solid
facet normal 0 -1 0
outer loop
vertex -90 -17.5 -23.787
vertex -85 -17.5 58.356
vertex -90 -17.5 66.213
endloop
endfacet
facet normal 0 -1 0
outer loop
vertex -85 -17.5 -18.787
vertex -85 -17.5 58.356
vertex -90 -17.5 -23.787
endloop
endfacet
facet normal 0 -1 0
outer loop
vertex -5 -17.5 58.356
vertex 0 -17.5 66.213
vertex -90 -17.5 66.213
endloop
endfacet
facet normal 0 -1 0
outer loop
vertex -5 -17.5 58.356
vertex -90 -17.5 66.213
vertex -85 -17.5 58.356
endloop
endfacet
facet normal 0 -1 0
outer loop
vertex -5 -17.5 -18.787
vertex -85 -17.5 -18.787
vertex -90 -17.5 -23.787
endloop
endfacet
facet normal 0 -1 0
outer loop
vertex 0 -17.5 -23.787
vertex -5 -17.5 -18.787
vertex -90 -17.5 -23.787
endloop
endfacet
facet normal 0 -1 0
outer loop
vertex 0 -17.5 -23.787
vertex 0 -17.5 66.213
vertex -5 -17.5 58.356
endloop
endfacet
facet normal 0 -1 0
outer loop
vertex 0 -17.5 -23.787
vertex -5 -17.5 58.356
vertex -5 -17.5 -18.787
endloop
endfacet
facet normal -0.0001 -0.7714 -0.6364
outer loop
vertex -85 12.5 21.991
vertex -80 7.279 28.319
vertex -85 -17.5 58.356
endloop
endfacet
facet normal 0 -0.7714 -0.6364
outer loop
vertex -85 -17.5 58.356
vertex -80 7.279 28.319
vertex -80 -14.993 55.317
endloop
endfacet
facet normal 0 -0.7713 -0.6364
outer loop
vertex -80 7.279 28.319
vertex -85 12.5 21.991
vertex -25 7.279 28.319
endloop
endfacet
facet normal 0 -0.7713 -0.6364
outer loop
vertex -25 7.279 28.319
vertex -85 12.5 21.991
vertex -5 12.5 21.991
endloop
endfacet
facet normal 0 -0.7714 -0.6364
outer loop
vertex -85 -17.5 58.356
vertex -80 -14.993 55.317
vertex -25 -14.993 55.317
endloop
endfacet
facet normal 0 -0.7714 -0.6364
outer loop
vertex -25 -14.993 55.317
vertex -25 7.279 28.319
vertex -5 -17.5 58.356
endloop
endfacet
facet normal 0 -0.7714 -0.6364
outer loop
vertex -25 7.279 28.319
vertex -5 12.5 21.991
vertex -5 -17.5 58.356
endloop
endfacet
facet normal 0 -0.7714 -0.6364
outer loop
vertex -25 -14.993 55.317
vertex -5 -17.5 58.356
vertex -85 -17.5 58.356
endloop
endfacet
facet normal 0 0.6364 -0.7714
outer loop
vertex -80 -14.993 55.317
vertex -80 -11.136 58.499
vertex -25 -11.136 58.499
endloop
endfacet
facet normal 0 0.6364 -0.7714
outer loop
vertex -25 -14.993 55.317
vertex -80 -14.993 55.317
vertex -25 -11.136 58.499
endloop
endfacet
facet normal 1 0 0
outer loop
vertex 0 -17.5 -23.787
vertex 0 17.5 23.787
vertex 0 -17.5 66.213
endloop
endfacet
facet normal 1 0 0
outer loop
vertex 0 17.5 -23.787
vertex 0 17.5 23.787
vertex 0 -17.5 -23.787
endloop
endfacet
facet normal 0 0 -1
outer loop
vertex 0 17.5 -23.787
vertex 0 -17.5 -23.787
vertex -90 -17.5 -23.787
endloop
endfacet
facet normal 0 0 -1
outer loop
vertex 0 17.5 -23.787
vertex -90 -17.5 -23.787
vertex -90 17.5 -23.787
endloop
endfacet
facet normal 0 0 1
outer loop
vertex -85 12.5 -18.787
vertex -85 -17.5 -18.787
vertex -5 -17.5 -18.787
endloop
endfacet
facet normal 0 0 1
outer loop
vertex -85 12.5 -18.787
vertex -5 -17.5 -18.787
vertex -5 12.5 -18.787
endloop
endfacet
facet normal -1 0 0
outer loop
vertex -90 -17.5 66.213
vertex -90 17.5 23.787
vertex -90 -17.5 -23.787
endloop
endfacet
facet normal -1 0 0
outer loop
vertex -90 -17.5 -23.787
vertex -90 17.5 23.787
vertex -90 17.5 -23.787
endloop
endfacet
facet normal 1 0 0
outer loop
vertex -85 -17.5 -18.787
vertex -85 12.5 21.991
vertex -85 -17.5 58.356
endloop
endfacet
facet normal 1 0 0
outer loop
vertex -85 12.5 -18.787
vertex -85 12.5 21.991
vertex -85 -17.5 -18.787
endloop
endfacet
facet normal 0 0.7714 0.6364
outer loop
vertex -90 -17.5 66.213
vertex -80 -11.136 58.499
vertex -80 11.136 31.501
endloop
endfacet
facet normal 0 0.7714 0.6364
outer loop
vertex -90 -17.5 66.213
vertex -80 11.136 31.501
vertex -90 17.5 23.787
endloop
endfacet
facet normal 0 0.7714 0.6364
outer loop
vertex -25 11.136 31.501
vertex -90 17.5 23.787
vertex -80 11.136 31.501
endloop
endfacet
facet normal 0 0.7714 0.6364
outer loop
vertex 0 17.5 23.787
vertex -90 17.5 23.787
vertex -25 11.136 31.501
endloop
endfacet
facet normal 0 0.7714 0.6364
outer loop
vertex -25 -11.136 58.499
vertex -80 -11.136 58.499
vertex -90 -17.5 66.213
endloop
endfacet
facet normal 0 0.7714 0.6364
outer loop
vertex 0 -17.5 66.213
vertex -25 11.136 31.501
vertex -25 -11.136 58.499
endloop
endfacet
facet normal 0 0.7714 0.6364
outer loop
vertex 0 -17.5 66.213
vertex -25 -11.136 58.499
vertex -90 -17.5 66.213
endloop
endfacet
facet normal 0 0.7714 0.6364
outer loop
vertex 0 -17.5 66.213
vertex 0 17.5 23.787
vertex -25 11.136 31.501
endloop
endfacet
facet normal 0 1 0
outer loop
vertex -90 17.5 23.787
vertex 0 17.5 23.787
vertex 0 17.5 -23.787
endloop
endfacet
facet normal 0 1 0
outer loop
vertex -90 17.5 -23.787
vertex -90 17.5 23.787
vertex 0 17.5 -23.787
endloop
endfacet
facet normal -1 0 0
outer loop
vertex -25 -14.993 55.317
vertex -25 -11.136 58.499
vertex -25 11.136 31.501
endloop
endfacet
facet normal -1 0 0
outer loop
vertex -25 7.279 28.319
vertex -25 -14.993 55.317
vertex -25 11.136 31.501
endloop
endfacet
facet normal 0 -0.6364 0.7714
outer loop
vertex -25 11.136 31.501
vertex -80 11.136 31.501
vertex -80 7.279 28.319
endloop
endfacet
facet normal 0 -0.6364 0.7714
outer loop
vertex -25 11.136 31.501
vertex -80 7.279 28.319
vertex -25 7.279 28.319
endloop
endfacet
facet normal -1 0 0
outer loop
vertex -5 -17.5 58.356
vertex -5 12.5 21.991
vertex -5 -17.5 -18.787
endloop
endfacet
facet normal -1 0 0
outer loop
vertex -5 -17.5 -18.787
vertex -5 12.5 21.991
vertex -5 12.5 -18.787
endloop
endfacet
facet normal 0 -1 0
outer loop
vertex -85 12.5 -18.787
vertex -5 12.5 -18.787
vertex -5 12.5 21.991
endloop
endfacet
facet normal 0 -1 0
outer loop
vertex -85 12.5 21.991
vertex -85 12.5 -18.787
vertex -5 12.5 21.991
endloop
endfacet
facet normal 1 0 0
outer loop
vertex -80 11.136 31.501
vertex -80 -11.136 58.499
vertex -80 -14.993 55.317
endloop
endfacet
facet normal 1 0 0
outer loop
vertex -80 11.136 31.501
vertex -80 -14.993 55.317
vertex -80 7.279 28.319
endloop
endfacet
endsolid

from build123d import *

# Parameters (mm, degrees)
SKETCH2_W               = 47.573593128
SKETCH2_H               = 35
BOSS_EXTRUDE1_DEPTH     = 90
CUT_EXTRUDE1_DEPTH      = 40
CUT_EXTRUDE1_DEPTH_BACK = 40
SKETCH4_W               = 55
SKETCH4_H               = 35
CUT_EXTRUDE2_DEPTH      = 5


with BuildPart() as part:
    # Sketch2 → Boss-Extrude1 (new body)
    with BuildSketch(Plane(origin=(0, 0, 0), x_dir=(0, 0, -1), z_dir=(1, 0, 0))):
        Polygon((-23.786796564, 17.5), (-66.213203436, -17.5), (-23.786796564, -17.5), align=None)
        Rectangle(SKETCH2_W, SKETCH2_H)
        Polygon((-21.990568975, 12.5), (-23.786796564, 11.018187839), (-23.786796564, -17.5), (18.786796564, -17.5), (18.786796564, 12.5), align=None)
        Polygon((-23.786796564, -17.5), (-23.786796564, 11.018187839), (-58.356060578, -17.5), align=None)
    extrude(amount=-BOSS_EXTRUDE1_DEPTH)

    # Sketch3 → Cut-Extrude1 (cut, two sides: drawn at the far end of the back side and taken through both)
    with BuildSketch(Plane.ZY.offset(45).offset(-CUT_EXTRUDE1_DEPTH_BACK)):
        Polygon((-18.786796564, -17.5), (-18.786796564, 12.5), (21.990568975, 12.5), (58.356060578, -17.5), align=None)
    extrude(amount=CUT_EXTRUDE1_DEPTH + CUT_EXTRUDE1_DEPTH_BACK, mode=Mode.SUBTRACT)

    # Sketch4 → Cut-Extrude2 (cut)
    with BuildSketch(Plane(origin=(0, 22.08978209, 18.223140496), x_dir=(1, 0, 0), z_dir=(0, 0.77138921583987, 0.6363636363636365))):
        with Locations((-52.5, -34.712514713)):
            Rectangle(SKETCH4_W, SKETCH4_H)
    extrude(amount=-CUT_EXTRUDE2_DEPTH, mode=Mode.SUBTRACT)


solid = part.part
